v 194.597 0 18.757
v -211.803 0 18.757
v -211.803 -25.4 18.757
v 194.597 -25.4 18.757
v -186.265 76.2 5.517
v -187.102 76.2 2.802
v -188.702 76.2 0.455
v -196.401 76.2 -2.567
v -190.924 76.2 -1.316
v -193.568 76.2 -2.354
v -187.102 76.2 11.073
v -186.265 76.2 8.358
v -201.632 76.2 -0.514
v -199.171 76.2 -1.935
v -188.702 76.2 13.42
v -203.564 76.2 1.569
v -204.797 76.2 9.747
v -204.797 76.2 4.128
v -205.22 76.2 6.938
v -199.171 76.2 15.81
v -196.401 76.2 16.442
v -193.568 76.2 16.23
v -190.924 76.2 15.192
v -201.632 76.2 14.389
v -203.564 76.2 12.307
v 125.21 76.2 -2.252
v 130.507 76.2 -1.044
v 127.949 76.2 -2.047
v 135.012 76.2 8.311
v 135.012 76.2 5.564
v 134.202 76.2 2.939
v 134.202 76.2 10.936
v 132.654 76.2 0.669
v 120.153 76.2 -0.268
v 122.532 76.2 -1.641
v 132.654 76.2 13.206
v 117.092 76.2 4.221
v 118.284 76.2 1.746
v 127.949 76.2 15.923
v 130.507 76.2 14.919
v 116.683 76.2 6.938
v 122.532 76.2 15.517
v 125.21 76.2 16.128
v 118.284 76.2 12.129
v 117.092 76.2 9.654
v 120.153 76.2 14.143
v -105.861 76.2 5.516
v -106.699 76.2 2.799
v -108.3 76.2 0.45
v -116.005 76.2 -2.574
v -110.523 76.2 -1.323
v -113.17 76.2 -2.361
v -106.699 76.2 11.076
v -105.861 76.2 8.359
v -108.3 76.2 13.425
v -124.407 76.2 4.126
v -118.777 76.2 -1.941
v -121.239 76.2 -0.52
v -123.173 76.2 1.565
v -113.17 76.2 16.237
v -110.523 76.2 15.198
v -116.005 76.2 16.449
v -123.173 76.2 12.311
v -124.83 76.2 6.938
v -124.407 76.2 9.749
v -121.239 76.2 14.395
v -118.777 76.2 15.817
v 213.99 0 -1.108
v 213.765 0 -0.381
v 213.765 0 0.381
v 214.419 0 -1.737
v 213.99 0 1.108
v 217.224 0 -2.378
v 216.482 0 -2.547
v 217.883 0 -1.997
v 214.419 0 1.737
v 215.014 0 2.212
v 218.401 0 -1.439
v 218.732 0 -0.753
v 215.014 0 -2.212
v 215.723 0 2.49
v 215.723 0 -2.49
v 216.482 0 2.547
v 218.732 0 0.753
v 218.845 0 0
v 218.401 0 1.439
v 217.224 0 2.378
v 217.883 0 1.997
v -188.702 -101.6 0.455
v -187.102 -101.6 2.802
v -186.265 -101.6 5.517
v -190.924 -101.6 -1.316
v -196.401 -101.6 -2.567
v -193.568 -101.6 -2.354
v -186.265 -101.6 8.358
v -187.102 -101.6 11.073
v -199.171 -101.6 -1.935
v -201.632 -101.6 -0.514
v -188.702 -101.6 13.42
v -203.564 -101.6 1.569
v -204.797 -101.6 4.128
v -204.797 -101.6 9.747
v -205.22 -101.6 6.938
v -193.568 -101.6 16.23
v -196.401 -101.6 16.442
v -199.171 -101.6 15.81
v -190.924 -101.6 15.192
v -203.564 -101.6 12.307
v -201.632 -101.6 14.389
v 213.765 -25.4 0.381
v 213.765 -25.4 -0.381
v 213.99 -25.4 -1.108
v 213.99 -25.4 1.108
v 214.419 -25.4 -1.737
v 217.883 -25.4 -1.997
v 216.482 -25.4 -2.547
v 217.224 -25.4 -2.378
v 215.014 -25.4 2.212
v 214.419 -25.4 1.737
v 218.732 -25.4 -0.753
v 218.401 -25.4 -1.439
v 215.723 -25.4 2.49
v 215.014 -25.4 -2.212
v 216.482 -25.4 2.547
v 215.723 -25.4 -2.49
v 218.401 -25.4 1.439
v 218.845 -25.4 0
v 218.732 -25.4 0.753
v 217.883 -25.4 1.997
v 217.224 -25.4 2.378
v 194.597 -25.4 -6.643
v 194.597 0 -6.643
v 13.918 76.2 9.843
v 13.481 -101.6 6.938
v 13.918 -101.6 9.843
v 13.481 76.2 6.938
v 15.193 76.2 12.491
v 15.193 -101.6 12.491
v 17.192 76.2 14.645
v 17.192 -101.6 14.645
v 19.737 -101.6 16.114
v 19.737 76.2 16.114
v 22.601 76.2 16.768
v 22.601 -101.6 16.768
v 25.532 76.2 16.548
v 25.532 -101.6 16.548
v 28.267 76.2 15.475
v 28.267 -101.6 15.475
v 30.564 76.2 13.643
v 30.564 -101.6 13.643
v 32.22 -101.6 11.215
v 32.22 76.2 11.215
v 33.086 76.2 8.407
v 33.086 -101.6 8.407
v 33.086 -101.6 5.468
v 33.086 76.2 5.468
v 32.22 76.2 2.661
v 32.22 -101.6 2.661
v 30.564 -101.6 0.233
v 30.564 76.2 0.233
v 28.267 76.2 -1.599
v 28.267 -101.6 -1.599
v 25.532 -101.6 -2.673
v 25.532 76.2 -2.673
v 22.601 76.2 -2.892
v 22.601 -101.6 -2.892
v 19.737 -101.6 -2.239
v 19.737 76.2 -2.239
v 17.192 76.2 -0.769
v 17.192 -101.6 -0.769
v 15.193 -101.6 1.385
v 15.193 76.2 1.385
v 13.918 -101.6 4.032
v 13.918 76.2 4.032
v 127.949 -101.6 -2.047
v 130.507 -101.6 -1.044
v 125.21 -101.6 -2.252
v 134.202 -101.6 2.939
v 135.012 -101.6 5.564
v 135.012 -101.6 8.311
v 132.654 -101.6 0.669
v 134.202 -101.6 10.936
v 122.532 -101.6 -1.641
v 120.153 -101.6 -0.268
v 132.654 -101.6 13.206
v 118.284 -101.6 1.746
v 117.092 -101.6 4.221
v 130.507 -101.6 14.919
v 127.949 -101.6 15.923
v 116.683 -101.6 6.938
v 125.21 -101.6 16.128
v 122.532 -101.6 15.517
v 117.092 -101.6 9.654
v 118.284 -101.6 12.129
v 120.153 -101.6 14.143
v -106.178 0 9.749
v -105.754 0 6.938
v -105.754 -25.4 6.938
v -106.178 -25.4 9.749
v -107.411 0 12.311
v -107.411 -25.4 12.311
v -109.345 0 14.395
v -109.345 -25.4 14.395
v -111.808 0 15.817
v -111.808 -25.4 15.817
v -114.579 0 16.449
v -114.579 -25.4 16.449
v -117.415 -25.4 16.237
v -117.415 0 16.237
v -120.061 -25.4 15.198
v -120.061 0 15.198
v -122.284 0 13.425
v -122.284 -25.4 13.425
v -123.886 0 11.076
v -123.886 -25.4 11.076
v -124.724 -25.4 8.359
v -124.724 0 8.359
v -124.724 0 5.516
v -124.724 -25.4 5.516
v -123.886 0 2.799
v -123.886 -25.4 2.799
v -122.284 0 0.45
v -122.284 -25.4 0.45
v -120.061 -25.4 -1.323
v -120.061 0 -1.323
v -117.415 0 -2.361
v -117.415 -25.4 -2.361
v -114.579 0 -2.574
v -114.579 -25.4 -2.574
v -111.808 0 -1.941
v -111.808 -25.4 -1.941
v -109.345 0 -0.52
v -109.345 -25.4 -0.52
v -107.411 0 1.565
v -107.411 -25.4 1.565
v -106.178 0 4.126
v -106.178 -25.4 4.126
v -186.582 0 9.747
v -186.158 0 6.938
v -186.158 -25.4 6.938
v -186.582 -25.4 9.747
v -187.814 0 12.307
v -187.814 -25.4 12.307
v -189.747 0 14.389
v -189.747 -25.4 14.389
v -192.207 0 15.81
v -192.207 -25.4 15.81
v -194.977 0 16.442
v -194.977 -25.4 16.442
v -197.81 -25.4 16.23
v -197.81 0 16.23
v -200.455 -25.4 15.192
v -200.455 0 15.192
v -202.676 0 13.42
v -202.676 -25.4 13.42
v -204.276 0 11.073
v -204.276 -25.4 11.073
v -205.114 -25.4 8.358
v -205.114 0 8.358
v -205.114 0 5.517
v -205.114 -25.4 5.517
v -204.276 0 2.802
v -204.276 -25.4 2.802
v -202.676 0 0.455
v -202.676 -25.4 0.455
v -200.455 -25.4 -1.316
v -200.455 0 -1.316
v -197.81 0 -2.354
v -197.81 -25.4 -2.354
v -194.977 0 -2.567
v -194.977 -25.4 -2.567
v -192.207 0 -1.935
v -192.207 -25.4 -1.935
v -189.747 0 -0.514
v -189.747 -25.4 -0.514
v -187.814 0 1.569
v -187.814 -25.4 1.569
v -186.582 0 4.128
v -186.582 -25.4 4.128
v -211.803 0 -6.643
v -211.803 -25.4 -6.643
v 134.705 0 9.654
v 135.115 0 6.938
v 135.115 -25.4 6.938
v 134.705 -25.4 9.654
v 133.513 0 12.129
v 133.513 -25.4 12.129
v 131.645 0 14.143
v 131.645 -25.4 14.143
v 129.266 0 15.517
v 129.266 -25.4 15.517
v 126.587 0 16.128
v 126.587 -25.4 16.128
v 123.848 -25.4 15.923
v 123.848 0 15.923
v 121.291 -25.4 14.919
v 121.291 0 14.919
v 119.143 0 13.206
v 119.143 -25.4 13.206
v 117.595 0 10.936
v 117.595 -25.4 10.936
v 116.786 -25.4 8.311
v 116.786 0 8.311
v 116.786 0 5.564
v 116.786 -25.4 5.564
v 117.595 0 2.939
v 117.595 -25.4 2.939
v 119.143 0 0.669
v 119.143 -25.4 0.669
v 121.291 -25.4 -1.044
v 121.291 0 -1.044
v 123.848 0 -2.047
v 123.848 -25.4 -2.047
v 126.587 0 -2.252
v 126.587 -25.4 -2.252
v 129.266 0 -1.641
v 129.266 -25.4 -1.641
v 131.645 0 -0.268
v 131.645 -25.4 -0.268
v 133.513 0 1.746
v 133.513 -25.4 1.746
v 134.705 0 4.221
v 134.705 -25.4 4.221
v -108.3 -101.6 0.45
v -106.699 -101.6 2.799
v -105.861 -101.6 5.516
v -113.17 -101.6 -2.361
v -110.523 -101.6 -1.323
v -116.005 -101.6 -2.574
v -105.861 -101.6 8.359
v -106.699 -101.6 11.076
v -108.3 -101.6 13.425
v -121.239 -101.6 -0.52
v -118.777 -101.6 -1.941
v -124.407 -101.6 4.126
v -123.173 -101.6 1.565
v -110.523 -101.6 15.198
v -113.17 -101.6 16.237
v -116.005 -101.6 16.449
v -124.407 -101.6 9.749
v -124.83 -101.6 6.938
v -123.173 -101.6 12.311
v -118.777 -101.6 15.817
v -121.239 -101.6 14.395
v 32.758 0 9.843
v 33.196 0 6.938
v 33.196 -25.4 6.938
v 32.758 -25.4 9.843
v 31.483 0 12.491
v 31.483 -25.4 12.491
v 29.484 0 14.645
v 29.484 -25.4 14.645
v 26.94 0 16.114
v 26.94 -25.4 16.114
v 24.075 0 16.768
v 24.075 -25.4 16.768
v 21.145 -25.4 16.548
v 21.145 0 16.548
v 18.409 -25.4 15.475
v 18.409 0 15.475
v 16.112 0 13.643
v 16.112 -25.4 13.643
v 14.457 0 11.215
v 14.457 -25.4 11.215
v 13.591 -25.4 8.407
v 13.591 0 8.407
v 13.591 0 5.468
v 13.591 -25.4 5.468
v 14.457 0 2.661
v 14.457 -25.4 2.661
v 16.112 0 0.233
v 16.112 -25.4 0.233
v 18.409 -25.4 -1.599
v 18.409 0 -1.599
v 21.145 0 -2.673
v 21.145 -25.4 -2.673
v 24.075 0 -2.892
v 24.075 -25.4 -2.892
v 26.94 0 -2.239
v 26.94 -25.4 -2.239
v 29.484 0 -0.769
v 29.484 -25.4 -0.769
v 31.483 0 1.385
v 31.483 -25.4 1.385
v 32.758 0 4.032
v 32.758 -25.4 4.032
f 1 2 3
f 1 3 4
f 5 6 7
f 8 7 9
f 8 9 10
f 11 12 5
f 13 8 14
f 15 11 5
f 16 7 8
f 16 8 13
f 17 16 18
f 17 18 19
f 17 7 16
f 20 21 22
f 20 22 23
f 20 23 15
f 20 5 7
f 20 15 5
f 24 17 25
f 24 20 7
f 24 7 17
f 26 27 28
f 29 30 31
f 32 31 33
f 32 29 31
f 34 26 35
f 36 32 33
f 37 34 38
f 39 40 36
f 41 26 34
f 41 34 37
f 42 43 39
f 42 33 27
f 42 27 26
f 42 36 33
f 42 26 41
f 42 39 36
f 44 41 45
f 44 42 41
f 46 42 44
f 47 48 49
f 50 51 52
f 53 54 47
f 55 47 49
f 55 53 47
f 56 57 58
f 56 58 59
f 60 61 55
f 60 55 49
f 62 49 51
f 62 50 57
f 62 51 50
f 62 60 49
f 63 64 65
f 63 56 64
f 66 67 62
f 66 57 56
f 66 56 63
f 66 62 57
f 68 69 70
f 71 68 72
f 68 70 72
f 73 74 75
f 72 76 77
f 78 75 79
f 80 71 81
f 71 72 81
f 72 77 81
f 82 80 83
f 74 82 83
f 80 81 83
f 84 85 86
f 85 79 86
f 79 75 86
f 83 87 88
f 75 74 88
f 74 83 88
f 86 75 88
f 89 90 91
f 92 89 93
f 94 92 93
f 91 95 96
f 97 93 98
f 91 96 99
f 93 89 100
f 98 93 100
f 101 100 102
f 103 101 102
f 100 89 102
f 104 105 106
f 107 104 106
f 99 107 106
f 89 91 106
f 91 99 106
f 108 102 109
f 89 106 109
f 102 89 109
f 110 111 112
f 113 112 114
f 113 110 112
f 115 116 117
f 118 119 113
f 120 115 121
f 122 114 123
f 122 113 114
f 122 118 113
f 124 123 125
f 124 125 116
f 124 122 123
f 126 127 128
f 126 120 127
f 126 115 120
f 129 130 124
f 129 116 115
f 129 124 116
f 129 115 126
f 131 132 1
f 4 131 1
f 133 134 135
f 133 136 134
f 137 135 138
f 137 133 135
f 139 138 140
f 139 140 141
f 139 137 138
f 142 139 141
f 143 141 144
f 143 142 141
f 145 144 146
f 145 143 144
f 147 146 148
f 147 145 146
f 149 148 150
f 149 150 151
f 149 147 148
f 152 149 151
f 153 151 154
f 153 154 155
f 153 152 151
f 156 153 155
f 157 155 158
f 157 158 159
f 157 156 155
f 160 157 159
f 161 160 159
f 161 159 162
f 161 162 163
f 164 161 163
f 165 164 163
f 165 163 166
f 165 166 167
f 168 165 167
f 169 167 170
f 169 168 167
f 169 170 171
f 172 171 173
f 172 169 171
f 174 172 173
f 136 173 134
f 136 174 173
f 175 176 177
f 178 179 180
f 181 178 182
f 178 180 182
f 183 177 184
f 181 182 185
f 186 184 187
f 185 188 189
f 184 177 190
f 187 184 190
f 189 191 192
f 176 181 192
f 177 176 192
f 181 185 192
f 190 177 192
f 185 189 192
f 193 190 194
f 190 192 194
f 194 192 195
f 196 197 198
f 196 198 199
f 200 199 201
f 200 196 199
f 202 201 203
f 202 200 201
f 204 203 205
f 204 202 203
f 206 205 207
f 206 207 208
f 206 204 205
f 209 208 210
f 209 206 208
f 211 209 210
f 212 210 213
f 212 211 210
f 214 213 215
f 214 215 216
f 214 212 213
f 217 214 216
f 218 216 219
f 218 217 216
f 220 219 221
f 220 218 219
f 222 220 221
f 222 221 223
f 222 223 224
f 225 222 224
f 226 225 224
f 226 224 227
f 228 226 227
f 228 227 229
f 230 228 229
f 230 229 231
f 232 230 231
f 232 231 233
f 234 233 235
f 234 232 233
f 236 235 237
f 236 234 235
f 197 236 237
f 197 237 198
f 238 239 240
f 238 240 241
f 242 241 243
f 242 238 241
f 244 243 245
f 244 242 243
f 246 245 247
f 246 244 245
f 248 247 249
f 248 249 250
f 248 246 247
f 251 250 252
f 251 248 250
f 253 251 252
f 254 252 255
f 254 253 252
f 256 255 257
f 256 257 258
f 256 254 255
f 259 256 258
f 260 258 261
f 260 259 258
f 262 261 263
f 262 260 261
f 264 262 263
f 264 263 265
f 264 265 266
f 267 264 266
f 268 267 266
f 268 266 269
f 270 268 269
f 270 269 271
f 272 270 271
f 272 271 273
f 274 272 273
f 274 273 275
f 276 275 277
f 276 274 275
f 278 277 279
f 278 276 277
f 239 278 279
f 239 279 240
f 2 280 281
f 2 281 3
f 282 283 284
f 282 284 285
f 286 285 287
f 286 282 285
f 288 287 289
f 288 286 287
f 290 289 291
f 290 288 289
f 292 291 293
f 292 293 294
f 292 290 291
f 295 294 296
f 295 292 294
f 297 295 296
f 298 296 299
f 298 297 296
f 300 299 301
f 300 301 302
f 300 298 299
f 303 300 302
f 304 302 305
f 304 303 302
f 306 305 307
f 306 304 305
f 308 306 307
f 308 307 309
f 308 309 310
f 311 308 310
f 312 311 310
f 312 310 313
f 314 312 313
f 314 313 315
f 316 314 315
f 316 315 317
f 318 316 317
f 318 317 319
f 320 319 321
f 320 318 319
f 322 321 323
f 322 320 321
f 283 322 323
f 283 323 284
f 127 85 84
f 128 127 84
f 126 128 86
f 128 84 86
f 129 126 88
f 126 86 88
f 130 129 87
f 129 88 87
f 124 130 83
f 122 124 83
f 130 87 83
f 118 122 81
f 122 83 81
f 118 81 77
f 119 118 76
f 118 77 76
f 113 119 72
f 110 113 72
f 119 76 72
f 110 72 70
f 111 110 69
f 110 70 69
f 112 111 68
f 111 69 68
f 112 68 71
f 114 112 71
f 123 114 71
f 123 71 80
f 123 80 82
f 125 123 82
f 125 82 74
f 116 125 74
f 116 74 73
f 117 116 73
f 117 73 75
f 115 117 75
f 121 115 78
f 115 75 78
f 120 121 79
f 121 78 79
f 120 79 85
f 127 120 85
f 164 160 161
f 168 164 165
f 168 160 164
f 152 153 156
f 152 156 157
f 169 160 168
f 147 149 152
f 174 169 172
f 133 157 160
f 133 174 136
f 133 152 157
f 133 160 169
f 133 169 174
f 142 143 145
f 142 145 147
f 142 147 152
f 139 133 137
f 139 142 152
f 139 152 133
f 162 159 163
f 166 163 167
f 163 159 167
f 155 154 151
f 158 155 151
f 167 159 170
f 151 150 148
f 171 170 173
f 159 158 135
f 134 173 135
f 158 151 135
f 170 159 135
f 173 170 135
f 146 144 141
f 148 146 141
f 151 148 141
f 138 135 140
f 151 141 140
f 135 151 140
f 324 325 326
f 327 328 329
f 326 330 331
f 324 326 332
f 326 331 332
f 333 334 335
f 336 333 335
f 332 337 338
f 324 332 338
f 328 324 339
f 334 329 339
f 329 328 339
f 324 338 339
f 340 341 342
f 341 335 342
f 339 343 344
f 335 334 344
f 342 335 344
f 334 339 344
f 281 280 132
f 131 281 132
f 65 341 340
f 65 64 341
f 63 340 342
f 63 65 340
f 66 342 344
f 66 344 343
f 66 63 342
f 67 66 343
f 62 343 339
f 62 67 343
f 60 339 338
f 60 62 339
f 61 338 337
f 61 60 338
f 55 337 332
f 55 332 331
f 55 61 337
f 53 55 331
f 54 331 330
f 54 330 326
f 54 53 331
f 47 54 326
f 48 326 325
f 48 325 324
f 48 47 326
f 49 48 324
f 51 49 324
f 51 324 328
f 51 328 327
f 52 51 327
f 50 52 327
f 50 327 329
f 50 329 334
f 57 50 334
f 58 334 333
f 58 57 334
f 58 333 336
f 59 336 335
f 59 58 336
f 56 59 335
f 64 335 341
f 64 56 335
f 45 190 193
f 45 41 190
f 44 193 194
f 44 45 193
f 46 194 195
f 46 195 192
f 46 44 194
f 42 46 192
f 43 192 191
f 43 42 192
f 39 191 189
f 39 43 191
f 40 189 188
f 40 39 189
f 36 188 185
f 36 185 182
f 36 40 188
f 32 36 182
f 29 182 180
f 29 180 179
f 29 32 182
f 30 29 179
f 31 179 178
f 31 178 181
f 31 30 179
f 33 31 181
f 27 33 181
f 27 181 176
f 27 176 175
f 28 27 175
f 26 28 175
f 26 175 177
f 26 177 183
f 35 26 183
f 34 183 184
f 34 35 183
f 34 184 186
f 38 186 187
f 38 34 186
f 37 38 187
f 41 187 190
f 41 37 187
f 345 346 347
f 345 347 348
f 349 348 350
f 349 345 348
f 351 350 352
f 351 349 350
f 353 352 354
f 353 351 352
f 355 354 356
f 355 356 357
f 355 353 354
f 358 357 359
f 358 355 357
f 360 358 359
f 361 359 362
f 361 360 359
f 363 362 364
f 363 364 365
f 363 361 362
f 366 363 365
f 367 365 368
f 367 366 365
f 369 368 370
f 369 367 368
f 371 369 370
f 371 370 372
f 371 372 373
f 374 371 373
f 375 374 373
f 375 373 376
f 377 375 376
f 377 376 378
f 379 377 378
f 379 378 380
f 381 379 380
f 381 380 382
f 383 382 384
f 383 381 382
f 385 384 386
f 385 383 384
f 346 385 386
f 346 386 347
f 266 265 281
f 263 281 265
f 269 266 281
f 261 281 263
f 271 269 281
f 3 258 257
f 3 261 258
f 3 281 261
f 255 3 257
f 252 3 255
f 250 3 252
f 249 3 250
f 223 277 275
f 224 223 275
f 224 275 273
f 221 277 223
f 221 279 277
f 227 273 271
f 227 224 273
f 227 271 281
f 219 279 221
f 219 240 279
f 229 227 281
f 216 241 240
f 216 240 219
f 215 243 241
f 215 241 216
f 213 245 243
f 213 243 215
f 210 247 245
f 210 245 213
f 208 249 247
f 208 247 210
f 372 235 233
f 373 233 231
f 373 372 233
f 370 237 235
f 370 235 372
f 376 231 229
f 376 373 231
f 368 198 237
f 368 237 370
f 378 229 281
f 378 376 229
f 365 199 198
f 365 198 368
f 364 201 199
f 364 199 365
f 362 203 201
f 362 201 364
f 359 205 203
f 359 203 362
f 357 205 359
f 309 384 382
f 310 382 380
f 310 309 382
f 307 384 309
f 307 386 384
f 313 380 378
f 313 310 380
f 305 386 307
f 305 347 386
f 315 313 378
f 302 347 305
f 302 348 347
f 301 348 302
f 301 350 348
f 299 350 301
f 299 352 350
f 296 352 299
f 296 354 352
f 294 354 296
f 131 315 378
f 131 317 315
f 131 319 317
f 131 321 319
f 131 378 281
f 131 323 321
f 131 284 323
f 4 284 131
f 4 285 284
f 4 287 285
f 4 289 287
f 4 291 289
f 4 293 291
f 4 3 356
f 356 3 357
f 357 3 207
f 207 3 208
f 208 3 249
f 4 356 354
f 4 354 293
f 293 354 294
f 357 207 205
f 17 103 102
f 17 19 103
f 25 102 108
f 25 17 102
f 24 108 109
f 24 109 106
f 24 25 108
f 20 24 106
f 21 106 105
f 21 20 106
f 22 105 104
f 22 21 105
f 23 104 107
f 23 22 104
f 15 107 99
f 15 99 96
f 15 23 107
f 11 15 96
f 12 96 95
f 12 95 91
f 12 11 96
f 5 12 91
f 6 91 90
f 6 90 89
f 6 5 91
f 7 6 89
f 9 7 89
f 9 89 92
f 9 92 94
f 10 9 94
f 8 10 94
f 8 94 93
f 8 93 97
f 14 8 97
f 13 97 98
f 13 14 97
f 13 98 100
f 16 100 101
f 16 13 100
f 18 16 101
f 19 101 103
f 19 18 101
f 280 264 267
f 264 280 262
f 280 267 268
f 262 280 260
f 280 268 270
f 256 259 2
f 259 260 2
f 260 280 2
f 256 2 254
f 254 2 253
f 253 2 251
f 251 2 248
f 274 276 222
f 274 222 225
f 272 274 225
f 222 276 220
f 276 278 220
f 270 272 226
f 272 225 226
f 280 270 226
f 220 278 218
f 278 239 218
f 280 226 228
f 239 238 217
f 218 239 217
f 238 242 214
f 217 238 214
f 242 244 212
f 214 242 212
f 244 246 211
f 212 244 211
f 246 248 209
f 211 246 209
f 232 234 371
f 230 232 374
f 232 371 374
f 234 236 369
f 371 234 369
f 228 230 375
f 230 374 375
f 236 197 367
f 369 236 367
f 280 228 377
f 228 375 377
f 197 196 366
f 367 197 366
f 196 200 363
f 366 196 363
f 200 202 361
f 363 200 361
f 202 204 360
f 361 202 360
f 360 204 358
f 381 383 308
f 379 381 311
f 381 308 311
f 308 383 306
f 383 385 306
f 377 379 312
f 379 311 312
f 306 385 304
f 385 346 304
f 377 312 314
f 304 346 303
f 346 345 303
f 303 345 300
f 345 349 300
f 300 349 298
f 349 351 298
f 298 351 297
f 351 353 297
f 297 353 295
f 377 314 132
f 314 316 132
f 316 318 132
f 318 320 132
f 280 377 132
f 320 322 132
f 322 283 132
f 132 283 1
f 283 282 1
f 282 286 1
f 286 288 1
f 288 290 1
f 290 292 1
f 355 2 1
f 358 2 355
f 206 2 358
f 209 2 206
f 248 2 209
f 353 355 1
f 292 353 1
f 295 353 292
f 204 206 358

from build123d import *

# Parameters (mm, degrees)
F0_W          = 406.4
F0_H          = 25.4
F0_R          = 9.531046
F0_R_2        = 9.538208
F0_R_3        = 9.857657
F0_R_4        = 9.215963
F0_R_5        = 2.554145
F1_DEPTH      = 25.4
F2_R          = 9.215963
F2_R_2        = 9.857657
F2_R_3        = 9.538208
F2_R_4        = 9.531046
F3_DEPTH      = 76.2
F3_DEPTH_BACK = 101.6


with BuildPart() as f1:
    # F0 (on Front) → F1 (new body)
    with BuildSketch(Plane.XZ):
        with Locations((-8.603327, 6.056766)):
            Rectangle(F0_W, F0_H)
        with Locations((-195.689216, 6.937694)):
            Circle(F0_R, mode=Mode.SUBTRACT)
        with Locations((-115.292259, 6.937694)):
            Circle(F0_R_2, mode=Mode.SUBTRACT)
        with Locations((23.33816, 6.937694)):
            Circle(F0_R_3, mode=Mode.SUBTRACT)
        with Locations((125.898615, 6.937694)):
            Circle(F0_R_4, mode=Mode.SUBTRACT)
        with Locations((216.290861, 0)):
            Circle(F0_R_5)
    extrude(amount=F1_DEPTH)


with BuildPart() as f3:
    # F2 (on face) → F3 (new body, two sides)
    with BuildSketch(Plane(origin=(0, 0, 0), x_dir=(-1, 0, 0), z_dir=(0, 1, 0))) as f3_sk:
        with Locations((-125.898615, 6.937694)):
            Circle(F2_R)
        with Locations((-23.33816, 6.937694)):
            Circle(F2_R_2)
        with Locations((115.292259, 6.937694)):
            Circle(F2_R_3)
        with Locations((195.689216, 6.937694)):
            Circle(F2_R_4)
    extrude(amount=F3_DEPTH)
    extrude(f3_sk.sketch, amount=-F3_DEPTH_BACK)


solid = Compound([f1.part, f3.part])
